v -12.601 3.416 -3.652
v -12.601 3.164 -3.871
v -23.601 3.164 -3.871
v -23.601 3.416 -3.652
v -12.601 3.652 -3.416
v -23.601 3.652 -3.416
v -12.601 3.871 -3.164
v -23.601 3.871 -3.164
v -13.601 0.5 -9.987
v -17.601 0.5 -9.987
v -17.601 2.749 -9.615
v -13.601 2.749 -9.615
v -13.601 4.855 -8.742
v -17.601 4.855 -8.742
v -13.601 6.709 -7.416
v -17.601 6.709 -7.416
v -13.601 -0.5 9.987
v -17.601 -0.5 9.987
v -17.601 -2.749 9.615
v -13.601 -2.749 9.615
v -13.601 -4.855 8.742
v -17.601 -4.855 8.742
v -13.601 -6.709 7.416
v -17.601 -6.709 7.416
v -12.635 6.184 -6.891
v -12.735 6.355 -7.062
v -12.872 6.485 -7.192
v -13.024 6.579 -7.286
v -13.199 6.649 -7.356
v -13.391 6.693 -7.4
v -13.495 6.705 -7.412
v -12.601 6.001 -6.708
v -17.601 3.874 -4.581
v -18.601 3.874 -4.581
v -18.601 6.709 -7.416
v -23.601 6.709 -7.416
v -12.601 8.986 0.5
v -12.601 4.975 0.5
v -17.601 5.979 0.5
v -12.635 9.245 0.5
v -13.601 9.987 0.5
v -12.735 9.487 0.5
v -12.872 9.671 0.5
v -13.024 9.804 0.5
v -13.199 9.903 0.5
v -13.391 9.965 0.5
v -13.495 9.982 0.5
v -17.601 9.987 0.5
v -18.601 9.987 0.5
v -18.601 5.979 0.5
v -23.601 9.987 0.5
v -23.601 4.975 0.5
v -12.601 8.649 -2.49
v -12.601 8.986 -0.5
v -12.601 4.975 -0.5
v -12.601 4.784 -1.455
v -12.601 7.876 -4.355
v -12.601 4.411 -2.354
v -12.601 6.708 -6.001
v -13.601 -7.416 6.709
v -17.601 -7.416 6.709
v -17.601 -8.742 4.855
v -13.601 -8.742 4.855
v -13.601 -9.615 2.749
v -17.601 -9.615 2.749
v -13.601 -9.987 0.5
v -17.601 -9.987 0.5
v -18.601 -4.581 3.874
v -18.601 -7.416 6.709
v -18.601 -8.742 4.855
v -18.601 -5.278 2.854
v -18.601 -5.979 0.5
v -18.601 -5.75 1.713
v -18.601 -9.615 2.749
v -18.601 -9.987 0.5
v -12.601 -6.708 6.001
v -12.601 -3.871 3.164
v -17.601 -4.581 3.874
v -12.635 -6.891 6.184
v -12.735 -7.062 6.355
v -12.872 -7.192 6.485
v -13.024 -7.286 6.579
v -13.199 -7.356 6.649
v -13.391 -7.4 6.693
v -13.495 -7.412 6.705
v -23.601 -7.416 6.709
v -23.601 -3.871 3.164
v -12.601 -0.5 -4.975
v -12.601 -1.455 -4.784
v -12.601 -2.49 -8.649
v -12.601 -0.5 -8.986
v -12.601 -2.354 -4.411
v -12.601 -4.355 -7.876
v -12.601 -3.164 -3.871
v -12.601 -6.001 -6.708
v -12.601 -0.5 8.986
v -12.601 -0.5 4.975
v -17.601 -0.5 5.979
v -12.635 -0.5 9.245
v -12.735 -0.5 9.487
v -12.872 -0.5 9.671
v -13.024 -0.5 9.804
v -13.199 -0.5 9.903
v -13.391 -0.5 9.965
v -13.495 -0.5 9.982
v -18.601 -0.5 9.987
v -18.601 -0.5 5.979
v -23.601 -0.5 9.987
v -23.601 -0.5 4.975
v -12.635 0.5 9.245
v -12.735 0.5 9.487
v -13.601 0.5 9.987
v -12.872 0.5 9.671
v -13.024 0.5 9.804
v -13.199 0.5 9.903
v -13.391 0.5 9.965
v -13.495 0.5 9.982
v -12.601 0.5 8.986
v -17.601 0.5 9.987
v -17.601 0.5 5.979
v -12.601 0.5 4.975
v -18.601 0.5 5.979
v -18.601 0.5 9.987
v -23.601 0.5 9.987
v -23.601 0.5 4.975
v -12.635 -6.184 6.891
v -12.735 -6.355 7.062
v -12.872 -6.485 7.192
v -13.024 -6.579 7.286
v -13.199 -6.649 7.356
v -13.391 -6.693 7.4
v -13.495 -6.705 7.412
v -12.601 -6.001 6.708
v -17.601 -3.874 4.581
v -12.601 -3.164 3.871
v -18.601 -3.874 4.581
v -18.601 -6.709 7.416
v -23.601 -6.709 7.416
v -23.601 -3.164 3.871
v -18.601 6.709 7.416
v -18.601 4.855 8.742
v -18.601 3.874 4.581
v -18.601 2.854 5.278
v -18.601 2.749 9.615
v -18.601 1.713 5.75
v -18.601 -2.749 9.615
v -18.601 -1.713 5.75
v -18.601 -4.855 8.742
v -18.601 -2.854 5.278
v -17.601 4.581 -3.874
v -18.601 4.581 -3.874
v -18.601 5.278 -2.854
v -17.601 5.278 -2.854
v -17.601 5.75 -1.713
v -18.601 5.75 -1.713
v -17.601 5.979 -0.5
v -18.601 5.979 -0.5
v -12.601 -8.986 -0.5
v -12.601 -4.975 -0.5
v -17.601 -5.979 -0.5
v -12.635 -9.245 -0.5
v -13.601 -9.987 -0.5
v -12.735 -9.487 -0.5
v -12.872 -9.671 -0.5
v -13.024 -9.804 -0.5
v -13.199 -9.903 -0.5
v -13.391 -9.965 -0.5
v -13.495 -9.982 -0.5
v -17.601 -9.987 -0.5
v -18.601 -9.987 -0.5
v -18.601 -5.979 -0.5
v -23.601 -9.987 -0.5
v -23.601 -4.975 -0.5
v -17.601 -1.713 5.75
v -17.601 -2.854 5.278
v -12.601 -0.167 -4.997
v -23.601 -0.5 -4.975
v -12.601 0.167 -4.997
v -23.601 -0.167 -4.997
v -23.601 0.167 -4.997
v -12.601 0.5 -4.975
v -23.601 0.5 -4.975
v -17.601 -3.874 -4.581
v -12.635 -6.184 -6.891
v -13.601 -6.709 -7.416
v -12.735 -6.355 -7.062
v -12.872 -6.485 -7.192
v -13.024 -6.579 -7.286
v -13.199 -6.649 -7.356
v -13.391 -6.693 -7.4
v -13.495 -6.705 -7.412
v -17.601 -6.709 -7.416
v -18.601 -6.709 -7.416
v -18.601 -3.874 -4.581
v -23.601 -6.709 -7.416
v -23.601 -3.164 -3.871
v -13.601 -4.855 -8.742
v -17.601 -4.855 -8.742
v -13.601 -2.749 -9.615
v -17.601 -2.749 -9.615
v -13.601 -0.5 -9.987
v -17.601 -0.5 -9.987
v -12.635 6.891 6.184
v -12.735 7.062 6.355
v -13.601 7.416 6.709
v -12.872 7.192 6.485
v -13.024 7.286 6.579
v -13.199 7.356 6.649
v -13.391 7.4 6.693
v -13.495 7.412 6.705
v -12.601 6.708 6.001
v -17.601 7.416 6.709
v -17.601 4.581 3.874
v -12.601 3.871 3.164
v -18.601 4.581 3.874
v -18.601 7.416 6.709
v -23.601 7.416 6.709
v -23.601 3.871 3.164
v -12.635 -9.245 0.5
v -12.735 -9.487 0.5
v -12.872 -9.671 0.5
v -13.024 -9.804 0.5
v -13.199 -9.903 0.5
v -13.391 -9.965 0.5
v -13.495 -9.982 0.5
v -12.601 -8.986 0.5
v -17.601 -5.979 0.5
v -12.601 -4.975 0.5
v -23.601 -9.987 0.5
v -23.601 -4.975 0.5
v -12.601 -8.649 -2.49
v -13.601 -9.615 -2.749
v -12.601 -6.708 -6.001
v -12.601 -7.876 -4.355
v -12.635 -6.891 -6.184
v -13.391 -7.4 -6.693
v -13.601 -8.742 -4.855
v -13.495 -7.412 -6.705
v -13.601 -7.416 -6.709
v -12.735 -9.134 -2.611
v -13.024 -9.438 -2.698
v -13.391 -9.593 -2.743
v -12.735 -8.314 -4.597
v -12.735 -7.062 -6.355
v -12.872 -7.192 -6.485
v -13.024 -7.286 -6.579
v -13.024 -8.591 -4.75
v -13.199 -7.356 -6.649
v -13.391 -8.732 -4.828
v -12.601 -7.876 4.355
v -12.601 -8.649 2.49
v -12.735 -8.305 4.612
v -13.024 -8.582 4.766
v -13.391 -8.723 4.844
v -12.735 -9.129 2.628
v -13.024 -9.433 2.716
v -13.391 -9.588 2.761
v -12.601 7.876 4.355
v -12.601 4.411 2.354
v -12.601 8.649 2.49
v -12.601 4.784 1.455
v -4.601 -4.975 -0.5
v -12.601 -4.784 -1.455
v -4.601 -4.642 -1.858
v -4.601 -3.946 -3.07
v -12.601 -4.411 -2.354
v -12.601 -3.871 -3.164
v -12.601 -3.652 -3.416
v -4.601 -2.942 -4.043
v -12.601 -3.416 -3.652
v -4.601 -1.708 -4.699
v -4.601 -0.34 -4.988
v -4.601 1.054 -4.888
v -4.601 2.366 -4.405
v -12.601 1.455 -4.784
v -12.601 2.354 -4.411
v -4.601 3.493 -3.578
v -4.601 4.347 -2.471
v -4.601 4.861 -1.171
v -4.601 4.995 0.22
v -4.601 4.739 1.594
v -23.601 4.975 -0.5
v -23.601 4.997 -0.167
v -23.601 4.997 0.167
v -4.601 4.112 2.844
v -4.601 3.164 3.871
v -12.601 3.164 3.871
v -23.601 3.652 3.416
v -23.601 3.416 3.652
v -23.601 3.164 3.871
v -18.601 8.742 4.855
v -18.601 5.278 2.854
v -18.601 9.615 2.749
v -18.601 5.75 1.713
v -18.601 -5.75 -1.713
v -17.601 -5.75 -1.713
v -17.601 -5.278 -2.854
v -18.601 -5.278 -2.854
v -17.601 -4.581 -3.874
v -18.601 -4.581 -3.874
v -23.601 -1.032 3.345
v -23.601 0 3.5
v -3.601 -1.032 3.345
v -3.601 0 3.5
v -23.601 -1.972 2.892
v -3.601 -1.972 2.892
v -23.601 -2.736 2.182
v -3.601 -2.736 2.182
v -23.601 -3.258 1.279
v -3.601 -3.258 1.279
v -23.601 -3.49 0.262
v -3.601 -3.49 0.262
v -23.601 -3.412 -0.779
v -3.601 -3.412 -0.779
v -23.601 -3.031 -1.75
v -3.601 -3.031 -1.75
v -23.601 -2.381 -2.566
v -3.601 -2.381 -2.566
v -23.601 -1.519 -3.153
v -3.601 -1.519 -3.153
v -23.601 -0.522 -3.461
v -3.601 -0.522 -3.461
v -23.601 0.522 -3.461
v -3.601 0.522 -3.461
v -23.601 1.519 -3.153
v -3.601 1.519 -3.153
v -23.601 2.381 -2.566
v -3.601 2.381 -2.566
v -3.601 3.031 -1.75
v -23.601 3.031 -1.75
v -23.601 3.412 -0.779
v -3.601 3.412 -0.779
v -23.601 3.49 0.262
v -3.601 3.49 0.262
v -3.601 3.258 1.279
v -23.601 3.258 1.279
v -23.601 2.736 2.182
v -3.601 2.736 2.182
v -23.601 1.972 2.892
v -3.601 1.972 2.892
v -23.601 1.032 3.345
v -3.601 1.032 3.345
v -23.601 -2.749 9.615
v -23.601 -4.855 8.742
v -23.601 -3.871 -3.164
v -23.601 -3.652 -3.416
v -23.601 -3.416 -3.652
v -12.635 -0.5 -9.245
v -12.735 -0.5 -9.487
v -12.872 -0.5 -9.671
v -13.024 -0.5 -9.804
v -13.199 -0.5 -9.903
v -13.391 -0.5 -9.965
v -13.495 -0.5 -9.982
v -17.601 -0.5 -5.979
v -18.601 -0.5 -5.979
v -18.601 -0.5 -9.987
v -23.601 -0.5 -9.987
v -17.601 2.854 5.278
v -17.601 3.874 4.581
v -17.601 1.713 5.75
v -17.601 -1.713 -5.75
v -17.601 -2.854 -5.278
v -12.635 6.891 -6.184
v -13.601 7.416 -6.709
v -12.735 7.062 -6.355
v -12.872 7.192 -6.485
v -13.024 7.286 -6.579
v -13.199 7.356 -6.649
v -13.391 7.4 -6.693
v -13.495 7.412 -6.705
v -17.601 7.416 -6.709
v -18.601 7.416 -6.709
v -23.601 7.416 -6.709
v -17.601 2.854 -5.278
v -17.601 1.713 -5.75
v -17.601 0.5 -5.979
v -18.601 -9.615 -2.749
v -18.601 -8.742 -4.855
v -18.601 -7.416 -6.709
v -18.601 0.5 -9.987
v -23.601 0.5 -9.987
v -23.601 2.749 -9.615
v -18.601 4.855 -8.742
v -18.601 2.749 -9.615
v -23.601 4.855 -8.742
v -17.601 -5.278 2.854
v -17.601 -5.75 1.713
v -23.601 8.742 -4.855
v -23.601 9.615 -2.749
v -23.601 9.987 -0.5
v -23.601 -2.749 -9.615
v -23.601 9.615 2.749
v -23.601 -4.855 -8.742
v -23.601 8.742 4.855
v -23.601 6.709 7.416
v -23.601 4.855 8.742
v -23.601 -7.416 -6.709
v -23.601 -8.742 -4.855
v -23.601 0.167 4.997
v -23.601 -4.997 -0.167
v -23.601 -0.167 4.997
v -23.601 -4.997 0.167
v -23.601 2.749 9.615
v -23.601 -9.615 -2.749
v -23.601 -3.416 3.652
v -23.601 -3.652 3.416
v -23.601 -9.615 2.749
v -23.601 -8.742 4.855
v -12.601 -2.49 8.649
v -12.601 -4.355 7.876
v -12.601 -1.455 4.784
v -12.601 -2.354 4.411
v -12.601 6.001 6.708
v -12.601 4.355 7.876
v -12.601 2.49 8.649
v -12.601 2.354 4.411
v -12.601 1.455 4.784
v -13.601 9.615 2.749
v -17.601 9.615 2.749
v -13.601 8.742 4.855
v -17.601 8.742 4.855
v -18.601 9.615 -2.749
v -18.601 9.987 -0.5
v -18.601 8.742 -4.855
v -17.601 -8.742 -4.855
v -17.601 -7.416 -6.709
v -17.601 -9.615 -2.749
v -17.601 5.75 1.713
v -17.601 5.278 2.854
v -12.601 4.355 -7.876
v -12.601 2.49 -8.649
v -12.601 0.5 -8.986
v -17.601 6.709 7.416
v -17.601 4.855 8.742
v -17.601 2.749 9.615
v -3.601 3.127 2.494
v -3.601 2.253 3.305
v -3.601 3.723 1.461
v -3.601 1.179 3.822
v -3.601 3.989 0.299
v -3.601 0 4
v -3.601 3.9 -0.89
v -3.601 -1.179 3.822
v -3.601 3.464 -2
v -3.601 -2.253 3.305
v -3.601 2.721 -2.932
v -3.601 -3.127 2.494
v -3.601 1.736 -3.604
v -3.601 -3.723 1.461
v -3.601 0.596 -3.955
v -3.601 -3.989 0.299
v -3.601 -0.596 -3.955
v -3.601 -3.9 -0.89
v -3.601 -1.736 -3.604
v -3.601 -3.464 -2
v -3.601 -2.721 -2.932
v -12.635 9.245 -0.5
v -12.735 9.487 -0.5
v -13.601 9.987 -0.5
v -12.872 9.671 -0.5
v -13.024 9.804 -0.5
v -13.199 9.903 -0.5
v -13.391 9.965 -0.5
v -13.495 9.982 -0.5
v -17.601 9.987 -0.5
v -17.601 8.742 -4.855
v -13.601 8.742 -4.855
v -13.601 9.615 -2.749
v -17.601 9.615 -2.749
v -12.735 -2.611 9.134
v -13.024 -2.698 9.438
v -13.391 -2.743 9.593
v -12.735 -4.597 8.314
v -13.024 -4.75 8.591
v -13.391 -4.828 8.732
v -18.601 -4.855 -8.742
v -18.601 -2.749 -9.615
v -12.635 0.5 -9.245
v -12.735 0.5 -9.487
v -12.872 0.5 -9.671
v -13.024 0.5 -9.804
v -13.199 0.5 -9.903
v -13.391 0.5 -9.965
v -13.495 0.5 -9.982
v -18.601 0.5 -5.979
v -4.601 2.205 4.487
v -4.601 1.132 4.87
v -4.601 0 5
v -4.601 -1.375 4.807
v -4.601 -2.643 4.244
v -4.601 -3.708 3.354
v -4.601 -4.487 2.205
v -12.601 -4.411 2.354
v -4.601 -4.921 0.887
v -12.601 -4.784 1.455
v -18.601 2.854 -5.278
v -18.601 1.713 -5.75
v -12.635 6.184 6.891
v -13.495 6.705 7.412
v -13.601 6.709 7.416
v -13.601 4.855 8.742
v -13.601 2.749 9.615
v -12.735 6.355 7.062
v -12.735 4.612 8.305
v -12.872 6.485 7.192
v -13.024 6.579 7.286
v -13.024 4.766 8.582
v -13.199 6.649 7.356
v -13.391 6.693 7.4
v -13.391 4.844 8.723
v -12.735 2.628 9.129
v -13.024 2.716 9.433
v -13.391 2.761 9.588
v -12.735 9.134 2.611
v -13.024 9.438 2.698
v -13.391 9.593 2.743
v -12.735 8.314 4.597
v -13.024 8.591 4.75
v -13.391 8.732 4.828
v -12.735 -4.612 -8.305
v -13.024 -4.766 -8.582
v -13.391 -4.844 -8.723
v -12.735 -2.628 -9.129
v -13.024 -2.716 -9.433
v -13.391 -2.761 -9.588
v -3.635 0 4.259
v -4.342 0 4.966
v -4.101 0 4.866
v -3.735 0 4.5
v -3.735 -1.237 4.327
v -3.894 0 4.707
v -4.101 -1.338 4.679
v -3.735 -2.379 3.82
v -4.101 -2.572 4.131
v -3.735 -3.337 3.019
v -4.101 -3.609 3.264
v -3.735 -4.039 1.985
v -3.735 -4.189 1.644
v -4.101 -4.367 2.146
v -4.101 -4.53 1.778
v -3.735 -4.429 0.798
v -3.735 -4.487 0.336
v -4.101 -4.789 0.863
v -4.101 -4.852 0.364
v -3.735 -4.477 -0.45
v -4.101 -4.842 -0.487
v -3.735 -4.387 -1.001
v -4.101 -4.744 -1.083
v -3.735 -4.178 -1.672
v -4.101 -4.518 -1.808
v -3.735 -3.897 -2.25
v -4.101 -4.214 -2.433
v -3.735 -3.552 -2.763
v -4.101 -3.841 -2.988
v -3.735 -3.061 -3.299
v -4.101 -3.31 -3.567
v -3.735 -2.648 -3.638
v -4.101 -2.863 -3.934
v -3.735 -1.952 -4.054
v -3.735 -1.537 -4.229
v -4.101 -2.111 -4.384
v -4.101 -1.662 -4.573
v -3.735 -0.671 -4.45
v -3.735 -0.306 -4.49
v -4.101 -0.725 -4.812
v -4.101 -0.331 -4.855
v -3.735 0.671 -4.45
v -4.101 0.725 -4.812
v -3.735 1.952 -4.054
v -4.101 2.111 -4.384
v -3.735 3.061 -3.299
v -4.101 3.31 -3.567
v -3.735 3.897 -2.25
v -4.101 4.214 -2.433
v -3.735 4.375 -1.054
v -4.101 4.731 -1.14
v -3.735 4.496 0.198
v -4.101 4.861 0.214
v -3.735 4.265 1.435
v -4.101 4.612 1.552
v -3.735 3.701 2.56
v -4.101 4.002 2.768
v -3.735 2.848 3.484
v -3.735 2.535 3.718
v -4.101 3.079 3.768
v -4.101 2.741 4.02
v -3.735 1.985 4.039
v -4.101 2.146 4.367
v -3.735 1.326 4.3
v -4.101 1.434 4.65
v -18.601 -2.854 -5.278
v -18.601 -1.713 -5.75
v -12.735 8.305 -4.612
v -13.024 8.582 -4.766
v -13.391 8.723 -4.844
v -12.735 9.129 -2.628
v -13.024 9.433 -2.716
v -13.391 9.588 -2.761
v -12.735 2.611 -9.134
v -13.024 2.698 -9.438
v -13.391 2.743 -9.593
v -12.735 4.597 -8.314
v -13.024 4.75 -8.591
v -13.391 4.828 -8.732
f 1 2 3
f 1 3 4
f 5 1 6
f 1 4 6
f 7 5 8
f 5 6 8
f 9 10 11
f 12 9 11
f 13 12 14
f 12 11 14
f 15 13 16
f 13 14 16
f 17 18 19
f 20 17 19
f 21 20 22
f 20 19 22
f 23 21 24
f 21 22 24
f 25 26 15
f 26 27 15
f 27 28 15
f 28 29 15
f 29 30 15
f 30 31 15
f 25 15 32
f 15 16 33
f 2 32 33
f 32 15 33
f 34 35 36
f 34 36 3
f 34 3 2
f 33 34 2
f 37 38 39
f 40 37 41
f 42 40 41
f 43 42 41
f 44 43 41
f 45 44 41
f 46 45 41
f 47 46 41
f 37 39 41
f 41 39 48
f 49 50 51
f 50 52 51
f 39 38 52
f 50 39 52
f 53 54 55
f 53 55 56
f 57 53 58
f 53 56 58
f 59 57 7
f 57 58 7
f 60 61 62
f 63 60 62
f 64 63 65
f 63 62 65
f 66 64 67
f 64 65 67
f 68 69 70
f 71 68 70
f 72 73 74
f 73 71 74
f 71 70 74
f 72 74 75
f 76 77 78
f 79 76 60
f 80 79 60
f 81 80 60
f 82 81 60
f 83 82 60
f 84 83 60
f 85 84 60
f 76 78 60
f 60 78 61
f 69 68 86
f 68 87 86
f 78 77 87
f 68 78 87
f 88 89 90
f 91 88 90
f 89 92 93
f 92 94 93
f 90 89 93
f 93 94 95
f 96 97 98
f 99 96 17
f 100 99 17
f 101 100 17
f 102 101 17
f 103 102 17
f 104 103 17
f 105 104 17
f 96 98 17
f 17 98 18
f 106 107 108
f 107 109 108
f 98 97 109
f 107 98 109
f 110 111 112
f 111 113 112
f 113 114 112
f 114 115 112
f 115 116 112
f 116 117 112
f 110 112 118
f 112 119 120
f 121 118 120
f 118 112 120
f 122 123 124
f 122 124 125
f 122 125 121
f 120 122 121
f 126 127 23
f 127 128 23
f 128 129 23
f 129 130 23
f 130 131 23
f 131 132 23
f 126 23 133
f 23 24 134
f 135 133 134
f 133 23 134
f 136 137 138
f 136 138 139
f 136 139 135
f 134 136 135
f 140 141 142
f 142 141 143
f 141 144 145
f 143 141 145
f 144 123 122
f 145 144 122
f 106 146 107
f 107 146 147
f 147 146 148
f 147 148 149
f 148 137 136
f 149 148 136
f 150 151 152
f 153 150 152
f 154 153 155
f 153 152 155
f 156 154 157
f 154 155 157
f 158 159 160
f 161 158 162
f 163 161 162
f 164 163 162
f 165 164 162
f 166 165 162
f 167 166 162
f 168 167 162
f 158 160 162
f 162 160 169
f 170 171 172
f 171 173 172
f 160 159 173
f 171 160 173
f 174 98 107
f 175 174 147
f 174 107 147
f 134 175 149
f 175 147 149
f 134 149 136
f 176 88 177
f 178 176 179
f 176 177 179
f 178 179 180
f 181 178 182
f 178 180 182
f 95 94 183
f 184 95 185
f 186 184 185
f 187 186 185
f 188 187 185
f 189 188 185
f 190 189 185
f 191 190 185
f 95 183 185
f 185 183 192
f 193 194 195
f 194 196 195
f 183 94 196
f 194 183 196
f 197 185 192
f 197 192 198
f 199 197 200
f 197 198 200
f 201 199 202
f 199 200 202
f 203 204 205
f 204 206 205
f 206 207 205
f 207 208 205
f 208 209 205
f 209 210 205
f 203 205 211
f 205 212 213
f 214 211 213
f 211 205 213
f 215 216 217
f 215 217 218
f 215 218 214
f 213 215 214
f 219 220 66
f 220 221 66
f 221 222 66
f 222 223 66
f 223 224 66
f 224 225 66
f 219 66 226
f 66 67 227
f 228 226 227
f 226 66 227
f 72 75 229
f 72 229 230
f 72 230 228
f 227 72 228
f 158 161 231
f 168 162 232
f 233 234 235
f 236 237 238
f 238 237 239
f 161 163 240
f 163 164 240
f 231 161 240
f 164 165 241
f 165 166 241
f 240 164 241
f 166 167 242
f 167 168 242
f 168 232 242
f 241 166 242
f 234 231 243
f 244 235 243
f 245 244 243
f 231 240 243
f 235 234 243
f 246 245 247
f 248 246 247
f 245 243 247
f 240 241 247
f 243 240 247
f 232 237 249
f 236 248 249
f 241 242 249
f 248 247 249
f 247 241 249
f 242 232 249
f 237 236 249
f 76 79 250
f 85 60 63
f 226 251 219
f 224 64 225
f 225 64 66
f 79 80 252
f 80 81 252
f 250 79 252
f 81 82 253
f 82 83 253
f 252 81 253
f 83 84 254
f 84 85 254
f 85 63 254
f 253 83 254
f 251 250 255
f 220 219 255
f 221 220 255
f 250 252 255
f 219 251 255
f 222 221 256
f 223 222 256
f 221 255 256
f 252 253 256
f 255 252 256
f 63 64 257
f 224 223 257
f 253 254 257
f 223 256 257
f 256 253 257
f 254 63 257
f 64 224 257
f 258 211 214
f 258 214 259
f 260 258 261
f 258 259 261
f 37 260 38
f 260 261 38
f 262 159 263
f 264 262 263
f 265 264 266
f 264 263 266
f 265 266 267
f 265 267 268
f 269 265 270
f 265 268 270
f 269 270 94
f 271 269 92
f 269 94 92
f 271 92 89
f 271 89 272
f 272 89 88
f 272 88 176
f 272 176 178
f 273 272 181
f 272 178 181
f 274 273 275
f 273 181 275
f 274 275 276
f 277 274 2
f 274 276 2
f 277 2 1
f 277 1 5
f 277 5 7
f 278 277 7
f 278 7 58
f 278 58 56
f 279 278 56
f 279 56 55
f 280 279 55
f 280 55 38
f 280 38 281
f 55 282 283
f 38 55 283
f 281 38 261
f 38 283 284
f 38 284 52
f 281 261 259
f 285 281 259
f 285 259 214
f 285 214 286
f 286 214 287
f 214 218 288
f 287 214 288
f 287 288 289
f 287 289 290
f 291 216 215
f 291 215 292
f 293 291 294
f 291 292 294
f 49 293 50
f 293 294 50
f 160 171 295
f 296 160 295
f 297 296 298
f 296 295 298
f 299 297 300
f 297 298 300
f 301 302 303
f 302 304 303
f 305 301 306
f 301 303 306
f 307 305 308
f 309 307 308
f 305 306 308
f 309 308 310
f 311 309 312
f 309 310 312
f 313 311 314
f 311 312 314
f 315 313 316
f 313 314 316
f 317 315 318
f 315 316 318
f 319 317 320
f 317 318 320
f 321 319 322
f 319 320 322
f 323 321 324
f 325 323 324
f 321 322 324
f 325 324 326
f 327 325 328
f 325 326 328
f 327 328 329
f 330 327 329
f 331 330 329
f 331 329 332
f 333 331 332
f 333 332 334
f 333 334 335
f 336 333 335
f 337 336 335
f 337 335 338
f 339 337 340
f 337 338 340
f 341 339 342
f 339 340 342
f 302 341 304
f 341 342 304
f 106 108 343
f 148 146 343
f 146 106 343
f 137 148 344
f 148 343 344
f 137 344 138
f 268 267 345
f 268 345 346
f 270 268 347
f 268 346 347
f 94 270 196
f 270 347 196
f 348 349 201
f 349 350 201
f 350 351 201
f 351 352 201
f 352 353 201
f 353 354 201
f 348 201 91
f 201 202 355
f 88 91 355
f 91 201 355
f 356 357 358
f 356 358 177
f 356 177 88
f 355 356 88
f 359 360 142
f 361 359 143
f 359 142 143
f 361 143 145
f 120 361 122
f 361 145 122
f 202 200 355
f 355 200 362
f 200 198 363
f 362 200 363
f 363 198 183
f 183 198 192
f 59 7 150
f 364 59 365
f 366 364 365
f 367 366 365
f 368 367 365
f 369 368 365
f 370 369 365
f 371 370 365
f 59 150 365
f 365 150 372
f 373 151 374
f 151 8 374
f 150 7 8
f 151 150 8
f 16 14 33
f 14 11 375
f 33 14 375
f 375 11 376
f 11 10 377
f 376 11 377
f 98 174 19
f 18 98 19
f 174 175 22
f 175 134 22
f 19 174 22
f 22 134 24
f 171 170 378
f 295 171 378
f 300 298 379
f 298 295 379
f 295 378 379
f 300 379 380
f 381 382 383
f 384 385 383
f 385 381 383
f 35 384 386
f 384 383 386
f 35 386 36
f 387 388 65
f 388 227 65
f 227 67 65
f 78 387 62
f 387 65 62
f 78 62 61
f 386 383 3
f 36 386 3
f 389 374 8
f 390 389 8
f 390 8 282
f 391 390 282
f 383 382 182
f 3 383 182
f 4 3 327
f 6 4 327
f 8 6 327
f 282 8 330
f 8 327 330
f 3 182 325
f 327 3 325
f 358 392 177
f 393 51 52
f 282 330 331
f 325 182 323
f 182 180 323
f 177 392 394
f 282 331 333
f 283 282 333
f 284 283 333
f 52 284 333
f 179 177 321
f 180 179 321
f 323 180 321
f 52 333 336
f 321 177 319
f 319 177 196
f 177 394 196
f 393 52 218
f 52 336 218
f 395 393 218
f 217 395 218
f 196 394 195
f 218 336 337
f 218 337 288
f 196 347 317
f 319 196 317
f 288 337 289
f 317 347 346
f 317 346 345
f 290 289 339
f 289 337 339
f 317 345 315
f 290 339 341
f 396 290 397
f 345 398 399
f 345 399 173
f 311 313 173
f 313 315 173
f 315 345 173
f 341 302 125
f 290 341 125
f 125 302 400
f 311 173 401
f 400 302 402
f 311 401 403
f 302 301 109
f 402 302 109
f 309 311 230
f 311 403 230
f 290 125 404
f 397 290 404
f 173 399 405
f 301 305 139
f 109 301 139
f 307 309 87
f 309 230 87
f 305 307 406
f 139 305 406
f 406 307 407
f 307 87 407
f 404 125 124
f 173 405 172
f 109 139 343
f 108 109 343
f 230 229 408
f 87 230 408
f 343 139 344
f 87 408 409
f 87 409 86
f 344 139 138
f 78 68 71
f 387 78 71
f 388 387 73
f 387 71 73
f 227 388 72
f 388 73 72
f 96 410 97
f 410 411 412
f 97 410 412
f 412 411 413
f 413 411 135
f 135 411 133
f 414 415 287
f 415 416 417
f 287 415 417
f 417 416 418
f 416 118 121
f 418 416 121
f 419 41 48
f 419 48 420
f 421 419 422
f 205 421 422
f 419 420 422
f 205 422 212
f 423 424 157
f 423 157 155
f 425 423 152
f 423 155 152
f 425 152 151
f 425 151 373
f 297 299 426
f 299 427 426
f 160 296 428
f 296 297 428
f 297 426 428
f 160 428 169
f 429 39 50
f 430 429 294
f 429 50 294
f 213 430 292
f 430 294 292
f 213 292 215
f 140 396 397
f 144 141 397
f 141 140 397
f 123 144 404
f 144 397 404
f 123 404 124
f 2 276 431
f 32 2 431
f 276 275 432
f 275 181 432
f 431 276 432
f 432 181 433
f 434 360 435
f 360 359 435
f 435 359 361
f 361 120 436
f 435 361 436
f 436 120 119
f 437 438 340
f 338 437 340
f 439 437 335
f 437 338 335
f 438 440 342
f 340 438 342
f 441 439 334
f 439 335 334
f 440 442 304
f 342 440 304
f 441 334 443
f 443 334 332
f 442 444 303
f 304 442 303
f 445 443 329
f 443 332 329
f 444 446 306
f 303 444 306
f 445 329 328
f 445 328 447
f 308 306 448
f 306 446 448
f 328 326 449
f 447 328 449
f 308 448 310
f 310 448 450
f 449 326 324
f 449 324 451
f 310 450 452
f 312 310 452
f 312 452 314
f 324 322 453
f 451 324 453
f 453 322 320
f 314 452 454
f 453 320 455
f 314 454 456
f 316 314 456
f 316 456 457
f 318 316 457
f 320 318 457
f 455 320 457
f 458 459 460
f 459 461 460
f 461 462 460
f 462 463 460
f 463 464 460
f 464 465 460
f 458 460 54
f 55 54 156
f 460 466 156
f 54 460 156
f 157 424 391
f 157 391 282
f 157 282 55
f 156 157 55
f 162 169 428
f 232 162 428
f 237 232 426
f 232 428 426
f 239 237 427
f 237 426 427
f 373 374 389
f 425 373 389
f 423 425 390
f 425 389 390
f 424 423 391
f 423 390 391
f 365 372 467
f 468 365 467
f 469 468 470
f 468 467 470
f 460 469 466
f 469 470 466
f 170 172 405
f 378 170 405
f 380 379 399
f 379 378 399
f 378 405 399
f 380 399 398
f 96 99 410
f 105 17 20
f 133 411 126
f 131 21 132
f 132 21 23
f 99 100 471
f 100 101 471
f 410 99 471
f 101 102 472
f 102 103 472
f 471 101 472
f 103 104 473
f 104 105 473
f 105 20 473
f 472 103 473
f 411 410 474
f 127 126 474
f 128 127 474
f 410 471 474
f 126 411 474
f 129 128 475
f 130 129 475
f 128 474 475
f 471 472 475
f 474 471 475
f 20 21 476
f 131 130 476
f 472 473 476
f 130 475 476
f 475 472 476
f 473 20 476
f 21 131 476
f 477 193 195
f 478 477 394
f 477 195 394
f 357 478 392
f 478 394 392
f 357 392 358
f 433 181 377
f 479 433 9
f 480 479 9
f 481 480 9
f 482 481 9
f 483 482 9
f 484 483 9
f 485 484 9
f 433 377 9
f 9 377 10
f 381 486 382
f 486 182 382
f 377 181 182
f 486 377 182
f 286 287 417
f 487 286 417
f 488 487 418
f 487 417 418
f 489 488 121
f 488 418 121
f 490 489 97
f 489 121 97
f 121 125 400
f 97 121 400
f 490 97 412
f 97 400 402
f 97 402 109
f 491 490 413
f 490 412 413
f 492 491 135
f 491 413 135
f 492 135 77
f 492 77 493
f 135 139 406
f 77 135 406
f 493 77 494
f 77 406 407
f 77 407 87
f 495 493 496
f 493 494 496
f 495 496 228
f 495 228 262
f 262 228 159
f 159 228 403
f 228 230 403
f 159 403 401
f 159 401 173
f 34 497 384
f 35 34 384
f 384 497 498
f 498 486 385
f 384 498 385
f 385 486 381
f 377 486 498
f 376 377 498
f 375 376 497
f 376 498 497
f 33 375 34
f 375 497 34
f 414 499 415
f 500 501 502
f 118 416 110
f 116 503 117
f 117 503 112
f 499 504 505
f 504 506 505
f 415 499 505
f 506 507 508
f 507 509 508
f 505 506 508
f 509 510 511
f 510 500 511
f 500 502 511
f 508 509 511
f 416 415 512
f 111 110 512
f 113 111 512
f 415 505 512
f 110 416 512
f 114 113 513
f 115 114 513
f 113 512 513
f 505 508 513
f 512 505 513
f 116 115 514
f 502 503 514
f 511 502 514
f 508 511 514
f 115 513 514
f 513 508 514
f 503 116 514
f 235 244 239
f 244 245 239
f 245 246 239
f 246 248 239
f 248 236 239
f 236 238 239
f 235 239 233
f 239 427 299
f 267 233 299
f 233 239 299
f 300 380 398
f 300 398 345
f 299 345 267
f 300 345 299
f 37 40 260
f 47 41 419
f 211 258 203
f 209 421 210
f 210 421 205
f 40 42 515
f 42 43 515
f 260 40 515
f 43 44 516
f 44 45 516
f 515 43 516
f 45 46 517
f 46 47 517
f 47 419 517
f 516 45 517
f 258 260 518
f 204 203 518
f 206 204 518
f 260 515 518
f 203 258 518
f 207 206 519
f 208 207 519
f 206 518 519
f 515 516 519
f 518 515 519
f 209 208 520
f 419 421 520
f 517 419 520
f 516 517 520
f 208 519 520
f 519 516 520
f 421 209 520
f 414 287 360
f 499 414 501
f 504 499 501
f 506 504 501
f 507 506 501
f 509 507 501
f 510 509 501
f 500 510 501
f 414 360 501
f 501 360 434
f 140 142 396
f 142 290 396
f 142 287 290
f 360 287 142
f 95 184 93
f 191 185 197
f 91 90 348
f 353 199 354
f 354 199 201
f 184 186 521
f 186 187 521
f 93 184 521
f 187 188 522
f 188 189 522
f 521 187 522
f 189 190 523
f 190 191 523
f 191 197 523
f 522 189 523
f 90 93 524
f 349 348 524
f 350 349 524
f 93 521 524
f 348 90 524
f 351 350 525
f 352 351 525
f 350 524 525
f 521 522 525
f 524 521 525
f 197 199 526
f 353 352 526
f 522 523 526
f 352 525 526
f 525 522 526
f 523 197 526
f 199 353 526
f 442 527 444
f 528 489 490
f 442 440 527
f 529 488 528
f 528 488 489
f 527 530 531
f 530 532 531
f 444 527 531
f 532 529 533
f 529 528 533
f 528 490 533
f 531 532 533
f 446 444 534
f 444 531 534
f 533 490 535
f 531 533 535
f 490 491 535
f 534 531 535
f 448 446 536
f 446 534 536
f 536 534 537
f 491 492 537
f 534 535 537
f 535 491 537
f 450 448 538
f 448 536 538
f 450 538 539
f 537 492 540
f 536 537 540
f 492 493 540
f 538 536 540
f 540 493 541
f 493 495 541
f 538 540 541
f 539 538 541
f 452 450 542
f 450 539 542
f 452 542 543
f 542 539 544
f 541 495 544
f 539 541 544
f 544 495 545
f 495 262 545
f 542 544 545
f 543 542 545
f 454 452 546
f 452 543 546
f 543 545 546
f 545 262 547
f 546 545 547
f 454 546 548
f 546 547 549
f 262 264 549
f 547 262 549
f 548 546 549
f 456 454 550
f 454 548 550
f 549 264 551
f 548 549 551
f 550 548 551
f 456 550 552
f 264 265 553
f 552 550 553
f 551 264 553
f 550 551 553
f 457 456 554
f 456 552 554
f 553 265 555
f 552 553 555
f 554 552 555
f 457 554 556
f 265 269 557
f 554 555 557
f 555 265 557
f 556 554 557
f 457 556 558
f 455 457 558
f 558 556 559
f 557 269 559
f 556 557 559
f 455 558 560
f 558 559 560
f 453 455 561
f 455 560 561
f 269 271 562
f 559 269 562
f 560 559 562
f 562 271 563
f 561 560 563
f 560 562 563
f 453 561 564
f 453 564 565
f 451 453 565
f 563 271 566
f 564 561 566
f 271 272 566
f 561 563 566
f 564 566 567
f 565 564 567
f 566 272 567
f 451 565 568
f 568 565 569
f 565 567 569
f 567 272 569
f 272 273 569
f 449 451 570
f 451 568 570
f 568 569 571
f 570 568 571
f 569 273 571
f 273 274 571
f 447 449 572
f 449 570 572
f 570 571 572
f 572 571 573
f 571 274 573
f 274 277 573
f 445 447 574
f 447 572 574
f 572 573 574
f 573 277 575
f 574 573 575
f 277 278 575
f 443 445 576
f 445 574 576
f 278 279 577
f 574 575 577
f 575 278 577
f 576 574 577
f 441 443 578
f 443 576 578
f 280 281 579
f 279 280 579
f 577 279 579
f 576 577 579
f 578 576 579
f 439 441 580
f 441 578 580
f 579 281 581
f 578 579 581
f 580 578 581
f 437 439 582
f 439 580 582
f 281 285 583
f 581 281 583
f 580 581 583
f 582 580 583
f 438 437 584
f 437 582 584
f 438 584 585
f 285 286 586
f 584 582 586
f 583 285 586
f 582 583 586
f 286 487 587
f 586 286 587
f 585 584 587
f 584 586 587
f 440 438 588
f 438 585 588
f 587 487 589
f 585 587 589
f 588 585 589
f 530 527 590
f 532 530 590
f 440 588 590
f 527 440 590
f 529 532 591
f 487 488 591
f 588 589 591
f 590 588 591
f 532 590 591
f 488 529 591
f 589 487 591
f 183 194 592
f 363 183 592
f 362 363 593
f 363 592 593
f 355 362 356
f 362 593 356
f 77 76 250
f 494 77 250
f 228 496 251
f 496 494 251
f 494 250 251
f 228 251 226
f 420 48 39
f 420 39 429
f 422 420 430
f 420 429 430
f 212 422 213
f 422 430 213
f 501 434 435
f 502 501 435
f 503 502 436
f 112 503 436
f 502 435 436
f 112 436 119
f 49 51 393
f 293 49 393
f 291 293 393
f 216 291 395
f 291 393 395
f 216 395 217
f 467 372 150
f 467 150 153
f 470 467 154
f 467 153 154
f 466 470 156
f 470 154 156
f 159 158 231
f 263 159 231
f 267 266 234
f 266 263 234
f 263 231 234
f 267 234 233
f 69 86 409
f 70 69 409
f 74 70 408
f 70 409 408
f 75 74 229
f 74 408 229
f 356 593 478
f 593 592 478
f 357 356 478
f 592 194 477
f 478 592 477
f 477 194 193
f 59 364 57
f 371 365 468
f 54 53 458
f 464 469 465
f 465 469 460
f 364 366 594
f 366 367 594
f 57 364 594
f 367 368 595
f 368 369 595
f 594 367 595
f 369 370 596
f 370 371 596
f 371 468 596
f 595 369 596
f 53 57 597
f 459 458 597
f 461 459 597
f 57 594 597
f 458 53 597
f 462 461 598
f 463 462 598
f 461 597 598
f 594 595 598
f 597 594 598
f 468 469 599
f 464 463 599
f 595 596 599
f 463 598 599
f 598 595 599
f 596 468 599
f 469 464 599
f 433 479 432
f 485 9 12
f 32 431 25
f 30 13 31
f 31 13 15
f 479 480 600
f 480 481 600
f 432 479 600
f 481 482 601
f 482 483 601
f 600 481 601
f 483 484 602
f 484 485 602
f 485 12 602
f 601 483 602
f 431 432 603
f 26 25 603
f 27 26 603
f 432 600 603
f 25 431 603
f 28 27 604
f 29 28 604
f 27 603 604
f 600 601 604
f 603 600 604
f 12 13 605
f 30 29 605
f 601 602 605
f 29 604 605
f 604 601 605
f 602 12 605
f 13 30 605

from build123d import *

# Parameters (mm, degrees)
TAGLIO_ESTRUSIONE1_DEPTH    = 25.494897427831784
RIPETIZIONECIRCOLARE1_COUNT = 8


with BuildPart() as part:
    # Schizzo1 → Rivoluzione1 (revolve)
    with BuildSketch(Plane.XY):
        with BuildLine():
            Line((-18.60104822335024, 10), (-23.60104822335024, 10.000000000000002))
            Line((-23.60104822335024, 10.000000000000002), (-23.60104822335024, 3.5))
            Line((-23.60104822335024, 3.5), (-3.60104822335024, 3.5))
            Line((-3.60104822335024, 3.5), (-3.6010482233502397, 3.9999999999999925))
            ThreePointArc((-3.6010482233502397, 3.9999999999999925), (-3.893941442163692, 4.707106781186547), (-4.601048223350247, 5))
            Line((-4.601048223350247, 5), (-12.601048223350238, 4.999999999999999))
            Line((-12.601048223350238, 4.999999999999999), (-12.601048223350238, 8.999999999999993))
            ThreePointArc((-12.601048223350238, 8.999999999999993), (-12.89394144216369, 9.707106781186548), (-13.601048223350245, 10))
            Line((-13.601048223350245, 10), (-17.60104822335024, 10))
            Line((-17.60104822335024, 10), (-17.60104822335024, 6))
            Line((-17.60104822335024, 6), (-18.60104822335024, 6))
            Line((-18.60104822335024, 6), (-18.60104822335024, 10))
        make_face()
    revolve(axis=Axis((-39.30950846023687, 0, 0), (1, 0, 0)))

    # Schizzo2 → Taglio-Estrusione1 (cut, through all)
    with BuildSketch(Plane.ZY.offset(23.60104822335024)):
        with BuildLine():
            Line((0.5, 4.974937185533099), (0.5, 10.752749152388752))
            Line((0.5, 10.752749152388752), (-0.5, 10.752749152388752))
            Line((-0.5, 10.752749152388752), (-0.5, 4.974937185533099))
            ThreePointArc((-0.5, 4.974937185533099), (3.1e-16, 4.999999999999999), (0.5, 4.974937185533099))
        make_face()
    taglio_estrusione1 = extrude(amount=-TAGLIO_ESTRUSIONE1_DEPTH, mode=Mode.SUBTRACT)

    # RipetizioneCircolare1: Taglio-Estrusione1 ×8 about axis
    ripetizionecircolare1_axis = Axis((-39.30950846023687, 0, 0), (-1, 0, 0))
    for i in range(1, RIPETIZIONECIRCOLARE1_COUNT):
        add(taglio_estrusione1.rotate(ripetizionecircolare1_axis, i * 360 / RIPETIZIONECIRCOLARE1_COUNT), mode=Mode.SUBTRACT)


solid = part.part
